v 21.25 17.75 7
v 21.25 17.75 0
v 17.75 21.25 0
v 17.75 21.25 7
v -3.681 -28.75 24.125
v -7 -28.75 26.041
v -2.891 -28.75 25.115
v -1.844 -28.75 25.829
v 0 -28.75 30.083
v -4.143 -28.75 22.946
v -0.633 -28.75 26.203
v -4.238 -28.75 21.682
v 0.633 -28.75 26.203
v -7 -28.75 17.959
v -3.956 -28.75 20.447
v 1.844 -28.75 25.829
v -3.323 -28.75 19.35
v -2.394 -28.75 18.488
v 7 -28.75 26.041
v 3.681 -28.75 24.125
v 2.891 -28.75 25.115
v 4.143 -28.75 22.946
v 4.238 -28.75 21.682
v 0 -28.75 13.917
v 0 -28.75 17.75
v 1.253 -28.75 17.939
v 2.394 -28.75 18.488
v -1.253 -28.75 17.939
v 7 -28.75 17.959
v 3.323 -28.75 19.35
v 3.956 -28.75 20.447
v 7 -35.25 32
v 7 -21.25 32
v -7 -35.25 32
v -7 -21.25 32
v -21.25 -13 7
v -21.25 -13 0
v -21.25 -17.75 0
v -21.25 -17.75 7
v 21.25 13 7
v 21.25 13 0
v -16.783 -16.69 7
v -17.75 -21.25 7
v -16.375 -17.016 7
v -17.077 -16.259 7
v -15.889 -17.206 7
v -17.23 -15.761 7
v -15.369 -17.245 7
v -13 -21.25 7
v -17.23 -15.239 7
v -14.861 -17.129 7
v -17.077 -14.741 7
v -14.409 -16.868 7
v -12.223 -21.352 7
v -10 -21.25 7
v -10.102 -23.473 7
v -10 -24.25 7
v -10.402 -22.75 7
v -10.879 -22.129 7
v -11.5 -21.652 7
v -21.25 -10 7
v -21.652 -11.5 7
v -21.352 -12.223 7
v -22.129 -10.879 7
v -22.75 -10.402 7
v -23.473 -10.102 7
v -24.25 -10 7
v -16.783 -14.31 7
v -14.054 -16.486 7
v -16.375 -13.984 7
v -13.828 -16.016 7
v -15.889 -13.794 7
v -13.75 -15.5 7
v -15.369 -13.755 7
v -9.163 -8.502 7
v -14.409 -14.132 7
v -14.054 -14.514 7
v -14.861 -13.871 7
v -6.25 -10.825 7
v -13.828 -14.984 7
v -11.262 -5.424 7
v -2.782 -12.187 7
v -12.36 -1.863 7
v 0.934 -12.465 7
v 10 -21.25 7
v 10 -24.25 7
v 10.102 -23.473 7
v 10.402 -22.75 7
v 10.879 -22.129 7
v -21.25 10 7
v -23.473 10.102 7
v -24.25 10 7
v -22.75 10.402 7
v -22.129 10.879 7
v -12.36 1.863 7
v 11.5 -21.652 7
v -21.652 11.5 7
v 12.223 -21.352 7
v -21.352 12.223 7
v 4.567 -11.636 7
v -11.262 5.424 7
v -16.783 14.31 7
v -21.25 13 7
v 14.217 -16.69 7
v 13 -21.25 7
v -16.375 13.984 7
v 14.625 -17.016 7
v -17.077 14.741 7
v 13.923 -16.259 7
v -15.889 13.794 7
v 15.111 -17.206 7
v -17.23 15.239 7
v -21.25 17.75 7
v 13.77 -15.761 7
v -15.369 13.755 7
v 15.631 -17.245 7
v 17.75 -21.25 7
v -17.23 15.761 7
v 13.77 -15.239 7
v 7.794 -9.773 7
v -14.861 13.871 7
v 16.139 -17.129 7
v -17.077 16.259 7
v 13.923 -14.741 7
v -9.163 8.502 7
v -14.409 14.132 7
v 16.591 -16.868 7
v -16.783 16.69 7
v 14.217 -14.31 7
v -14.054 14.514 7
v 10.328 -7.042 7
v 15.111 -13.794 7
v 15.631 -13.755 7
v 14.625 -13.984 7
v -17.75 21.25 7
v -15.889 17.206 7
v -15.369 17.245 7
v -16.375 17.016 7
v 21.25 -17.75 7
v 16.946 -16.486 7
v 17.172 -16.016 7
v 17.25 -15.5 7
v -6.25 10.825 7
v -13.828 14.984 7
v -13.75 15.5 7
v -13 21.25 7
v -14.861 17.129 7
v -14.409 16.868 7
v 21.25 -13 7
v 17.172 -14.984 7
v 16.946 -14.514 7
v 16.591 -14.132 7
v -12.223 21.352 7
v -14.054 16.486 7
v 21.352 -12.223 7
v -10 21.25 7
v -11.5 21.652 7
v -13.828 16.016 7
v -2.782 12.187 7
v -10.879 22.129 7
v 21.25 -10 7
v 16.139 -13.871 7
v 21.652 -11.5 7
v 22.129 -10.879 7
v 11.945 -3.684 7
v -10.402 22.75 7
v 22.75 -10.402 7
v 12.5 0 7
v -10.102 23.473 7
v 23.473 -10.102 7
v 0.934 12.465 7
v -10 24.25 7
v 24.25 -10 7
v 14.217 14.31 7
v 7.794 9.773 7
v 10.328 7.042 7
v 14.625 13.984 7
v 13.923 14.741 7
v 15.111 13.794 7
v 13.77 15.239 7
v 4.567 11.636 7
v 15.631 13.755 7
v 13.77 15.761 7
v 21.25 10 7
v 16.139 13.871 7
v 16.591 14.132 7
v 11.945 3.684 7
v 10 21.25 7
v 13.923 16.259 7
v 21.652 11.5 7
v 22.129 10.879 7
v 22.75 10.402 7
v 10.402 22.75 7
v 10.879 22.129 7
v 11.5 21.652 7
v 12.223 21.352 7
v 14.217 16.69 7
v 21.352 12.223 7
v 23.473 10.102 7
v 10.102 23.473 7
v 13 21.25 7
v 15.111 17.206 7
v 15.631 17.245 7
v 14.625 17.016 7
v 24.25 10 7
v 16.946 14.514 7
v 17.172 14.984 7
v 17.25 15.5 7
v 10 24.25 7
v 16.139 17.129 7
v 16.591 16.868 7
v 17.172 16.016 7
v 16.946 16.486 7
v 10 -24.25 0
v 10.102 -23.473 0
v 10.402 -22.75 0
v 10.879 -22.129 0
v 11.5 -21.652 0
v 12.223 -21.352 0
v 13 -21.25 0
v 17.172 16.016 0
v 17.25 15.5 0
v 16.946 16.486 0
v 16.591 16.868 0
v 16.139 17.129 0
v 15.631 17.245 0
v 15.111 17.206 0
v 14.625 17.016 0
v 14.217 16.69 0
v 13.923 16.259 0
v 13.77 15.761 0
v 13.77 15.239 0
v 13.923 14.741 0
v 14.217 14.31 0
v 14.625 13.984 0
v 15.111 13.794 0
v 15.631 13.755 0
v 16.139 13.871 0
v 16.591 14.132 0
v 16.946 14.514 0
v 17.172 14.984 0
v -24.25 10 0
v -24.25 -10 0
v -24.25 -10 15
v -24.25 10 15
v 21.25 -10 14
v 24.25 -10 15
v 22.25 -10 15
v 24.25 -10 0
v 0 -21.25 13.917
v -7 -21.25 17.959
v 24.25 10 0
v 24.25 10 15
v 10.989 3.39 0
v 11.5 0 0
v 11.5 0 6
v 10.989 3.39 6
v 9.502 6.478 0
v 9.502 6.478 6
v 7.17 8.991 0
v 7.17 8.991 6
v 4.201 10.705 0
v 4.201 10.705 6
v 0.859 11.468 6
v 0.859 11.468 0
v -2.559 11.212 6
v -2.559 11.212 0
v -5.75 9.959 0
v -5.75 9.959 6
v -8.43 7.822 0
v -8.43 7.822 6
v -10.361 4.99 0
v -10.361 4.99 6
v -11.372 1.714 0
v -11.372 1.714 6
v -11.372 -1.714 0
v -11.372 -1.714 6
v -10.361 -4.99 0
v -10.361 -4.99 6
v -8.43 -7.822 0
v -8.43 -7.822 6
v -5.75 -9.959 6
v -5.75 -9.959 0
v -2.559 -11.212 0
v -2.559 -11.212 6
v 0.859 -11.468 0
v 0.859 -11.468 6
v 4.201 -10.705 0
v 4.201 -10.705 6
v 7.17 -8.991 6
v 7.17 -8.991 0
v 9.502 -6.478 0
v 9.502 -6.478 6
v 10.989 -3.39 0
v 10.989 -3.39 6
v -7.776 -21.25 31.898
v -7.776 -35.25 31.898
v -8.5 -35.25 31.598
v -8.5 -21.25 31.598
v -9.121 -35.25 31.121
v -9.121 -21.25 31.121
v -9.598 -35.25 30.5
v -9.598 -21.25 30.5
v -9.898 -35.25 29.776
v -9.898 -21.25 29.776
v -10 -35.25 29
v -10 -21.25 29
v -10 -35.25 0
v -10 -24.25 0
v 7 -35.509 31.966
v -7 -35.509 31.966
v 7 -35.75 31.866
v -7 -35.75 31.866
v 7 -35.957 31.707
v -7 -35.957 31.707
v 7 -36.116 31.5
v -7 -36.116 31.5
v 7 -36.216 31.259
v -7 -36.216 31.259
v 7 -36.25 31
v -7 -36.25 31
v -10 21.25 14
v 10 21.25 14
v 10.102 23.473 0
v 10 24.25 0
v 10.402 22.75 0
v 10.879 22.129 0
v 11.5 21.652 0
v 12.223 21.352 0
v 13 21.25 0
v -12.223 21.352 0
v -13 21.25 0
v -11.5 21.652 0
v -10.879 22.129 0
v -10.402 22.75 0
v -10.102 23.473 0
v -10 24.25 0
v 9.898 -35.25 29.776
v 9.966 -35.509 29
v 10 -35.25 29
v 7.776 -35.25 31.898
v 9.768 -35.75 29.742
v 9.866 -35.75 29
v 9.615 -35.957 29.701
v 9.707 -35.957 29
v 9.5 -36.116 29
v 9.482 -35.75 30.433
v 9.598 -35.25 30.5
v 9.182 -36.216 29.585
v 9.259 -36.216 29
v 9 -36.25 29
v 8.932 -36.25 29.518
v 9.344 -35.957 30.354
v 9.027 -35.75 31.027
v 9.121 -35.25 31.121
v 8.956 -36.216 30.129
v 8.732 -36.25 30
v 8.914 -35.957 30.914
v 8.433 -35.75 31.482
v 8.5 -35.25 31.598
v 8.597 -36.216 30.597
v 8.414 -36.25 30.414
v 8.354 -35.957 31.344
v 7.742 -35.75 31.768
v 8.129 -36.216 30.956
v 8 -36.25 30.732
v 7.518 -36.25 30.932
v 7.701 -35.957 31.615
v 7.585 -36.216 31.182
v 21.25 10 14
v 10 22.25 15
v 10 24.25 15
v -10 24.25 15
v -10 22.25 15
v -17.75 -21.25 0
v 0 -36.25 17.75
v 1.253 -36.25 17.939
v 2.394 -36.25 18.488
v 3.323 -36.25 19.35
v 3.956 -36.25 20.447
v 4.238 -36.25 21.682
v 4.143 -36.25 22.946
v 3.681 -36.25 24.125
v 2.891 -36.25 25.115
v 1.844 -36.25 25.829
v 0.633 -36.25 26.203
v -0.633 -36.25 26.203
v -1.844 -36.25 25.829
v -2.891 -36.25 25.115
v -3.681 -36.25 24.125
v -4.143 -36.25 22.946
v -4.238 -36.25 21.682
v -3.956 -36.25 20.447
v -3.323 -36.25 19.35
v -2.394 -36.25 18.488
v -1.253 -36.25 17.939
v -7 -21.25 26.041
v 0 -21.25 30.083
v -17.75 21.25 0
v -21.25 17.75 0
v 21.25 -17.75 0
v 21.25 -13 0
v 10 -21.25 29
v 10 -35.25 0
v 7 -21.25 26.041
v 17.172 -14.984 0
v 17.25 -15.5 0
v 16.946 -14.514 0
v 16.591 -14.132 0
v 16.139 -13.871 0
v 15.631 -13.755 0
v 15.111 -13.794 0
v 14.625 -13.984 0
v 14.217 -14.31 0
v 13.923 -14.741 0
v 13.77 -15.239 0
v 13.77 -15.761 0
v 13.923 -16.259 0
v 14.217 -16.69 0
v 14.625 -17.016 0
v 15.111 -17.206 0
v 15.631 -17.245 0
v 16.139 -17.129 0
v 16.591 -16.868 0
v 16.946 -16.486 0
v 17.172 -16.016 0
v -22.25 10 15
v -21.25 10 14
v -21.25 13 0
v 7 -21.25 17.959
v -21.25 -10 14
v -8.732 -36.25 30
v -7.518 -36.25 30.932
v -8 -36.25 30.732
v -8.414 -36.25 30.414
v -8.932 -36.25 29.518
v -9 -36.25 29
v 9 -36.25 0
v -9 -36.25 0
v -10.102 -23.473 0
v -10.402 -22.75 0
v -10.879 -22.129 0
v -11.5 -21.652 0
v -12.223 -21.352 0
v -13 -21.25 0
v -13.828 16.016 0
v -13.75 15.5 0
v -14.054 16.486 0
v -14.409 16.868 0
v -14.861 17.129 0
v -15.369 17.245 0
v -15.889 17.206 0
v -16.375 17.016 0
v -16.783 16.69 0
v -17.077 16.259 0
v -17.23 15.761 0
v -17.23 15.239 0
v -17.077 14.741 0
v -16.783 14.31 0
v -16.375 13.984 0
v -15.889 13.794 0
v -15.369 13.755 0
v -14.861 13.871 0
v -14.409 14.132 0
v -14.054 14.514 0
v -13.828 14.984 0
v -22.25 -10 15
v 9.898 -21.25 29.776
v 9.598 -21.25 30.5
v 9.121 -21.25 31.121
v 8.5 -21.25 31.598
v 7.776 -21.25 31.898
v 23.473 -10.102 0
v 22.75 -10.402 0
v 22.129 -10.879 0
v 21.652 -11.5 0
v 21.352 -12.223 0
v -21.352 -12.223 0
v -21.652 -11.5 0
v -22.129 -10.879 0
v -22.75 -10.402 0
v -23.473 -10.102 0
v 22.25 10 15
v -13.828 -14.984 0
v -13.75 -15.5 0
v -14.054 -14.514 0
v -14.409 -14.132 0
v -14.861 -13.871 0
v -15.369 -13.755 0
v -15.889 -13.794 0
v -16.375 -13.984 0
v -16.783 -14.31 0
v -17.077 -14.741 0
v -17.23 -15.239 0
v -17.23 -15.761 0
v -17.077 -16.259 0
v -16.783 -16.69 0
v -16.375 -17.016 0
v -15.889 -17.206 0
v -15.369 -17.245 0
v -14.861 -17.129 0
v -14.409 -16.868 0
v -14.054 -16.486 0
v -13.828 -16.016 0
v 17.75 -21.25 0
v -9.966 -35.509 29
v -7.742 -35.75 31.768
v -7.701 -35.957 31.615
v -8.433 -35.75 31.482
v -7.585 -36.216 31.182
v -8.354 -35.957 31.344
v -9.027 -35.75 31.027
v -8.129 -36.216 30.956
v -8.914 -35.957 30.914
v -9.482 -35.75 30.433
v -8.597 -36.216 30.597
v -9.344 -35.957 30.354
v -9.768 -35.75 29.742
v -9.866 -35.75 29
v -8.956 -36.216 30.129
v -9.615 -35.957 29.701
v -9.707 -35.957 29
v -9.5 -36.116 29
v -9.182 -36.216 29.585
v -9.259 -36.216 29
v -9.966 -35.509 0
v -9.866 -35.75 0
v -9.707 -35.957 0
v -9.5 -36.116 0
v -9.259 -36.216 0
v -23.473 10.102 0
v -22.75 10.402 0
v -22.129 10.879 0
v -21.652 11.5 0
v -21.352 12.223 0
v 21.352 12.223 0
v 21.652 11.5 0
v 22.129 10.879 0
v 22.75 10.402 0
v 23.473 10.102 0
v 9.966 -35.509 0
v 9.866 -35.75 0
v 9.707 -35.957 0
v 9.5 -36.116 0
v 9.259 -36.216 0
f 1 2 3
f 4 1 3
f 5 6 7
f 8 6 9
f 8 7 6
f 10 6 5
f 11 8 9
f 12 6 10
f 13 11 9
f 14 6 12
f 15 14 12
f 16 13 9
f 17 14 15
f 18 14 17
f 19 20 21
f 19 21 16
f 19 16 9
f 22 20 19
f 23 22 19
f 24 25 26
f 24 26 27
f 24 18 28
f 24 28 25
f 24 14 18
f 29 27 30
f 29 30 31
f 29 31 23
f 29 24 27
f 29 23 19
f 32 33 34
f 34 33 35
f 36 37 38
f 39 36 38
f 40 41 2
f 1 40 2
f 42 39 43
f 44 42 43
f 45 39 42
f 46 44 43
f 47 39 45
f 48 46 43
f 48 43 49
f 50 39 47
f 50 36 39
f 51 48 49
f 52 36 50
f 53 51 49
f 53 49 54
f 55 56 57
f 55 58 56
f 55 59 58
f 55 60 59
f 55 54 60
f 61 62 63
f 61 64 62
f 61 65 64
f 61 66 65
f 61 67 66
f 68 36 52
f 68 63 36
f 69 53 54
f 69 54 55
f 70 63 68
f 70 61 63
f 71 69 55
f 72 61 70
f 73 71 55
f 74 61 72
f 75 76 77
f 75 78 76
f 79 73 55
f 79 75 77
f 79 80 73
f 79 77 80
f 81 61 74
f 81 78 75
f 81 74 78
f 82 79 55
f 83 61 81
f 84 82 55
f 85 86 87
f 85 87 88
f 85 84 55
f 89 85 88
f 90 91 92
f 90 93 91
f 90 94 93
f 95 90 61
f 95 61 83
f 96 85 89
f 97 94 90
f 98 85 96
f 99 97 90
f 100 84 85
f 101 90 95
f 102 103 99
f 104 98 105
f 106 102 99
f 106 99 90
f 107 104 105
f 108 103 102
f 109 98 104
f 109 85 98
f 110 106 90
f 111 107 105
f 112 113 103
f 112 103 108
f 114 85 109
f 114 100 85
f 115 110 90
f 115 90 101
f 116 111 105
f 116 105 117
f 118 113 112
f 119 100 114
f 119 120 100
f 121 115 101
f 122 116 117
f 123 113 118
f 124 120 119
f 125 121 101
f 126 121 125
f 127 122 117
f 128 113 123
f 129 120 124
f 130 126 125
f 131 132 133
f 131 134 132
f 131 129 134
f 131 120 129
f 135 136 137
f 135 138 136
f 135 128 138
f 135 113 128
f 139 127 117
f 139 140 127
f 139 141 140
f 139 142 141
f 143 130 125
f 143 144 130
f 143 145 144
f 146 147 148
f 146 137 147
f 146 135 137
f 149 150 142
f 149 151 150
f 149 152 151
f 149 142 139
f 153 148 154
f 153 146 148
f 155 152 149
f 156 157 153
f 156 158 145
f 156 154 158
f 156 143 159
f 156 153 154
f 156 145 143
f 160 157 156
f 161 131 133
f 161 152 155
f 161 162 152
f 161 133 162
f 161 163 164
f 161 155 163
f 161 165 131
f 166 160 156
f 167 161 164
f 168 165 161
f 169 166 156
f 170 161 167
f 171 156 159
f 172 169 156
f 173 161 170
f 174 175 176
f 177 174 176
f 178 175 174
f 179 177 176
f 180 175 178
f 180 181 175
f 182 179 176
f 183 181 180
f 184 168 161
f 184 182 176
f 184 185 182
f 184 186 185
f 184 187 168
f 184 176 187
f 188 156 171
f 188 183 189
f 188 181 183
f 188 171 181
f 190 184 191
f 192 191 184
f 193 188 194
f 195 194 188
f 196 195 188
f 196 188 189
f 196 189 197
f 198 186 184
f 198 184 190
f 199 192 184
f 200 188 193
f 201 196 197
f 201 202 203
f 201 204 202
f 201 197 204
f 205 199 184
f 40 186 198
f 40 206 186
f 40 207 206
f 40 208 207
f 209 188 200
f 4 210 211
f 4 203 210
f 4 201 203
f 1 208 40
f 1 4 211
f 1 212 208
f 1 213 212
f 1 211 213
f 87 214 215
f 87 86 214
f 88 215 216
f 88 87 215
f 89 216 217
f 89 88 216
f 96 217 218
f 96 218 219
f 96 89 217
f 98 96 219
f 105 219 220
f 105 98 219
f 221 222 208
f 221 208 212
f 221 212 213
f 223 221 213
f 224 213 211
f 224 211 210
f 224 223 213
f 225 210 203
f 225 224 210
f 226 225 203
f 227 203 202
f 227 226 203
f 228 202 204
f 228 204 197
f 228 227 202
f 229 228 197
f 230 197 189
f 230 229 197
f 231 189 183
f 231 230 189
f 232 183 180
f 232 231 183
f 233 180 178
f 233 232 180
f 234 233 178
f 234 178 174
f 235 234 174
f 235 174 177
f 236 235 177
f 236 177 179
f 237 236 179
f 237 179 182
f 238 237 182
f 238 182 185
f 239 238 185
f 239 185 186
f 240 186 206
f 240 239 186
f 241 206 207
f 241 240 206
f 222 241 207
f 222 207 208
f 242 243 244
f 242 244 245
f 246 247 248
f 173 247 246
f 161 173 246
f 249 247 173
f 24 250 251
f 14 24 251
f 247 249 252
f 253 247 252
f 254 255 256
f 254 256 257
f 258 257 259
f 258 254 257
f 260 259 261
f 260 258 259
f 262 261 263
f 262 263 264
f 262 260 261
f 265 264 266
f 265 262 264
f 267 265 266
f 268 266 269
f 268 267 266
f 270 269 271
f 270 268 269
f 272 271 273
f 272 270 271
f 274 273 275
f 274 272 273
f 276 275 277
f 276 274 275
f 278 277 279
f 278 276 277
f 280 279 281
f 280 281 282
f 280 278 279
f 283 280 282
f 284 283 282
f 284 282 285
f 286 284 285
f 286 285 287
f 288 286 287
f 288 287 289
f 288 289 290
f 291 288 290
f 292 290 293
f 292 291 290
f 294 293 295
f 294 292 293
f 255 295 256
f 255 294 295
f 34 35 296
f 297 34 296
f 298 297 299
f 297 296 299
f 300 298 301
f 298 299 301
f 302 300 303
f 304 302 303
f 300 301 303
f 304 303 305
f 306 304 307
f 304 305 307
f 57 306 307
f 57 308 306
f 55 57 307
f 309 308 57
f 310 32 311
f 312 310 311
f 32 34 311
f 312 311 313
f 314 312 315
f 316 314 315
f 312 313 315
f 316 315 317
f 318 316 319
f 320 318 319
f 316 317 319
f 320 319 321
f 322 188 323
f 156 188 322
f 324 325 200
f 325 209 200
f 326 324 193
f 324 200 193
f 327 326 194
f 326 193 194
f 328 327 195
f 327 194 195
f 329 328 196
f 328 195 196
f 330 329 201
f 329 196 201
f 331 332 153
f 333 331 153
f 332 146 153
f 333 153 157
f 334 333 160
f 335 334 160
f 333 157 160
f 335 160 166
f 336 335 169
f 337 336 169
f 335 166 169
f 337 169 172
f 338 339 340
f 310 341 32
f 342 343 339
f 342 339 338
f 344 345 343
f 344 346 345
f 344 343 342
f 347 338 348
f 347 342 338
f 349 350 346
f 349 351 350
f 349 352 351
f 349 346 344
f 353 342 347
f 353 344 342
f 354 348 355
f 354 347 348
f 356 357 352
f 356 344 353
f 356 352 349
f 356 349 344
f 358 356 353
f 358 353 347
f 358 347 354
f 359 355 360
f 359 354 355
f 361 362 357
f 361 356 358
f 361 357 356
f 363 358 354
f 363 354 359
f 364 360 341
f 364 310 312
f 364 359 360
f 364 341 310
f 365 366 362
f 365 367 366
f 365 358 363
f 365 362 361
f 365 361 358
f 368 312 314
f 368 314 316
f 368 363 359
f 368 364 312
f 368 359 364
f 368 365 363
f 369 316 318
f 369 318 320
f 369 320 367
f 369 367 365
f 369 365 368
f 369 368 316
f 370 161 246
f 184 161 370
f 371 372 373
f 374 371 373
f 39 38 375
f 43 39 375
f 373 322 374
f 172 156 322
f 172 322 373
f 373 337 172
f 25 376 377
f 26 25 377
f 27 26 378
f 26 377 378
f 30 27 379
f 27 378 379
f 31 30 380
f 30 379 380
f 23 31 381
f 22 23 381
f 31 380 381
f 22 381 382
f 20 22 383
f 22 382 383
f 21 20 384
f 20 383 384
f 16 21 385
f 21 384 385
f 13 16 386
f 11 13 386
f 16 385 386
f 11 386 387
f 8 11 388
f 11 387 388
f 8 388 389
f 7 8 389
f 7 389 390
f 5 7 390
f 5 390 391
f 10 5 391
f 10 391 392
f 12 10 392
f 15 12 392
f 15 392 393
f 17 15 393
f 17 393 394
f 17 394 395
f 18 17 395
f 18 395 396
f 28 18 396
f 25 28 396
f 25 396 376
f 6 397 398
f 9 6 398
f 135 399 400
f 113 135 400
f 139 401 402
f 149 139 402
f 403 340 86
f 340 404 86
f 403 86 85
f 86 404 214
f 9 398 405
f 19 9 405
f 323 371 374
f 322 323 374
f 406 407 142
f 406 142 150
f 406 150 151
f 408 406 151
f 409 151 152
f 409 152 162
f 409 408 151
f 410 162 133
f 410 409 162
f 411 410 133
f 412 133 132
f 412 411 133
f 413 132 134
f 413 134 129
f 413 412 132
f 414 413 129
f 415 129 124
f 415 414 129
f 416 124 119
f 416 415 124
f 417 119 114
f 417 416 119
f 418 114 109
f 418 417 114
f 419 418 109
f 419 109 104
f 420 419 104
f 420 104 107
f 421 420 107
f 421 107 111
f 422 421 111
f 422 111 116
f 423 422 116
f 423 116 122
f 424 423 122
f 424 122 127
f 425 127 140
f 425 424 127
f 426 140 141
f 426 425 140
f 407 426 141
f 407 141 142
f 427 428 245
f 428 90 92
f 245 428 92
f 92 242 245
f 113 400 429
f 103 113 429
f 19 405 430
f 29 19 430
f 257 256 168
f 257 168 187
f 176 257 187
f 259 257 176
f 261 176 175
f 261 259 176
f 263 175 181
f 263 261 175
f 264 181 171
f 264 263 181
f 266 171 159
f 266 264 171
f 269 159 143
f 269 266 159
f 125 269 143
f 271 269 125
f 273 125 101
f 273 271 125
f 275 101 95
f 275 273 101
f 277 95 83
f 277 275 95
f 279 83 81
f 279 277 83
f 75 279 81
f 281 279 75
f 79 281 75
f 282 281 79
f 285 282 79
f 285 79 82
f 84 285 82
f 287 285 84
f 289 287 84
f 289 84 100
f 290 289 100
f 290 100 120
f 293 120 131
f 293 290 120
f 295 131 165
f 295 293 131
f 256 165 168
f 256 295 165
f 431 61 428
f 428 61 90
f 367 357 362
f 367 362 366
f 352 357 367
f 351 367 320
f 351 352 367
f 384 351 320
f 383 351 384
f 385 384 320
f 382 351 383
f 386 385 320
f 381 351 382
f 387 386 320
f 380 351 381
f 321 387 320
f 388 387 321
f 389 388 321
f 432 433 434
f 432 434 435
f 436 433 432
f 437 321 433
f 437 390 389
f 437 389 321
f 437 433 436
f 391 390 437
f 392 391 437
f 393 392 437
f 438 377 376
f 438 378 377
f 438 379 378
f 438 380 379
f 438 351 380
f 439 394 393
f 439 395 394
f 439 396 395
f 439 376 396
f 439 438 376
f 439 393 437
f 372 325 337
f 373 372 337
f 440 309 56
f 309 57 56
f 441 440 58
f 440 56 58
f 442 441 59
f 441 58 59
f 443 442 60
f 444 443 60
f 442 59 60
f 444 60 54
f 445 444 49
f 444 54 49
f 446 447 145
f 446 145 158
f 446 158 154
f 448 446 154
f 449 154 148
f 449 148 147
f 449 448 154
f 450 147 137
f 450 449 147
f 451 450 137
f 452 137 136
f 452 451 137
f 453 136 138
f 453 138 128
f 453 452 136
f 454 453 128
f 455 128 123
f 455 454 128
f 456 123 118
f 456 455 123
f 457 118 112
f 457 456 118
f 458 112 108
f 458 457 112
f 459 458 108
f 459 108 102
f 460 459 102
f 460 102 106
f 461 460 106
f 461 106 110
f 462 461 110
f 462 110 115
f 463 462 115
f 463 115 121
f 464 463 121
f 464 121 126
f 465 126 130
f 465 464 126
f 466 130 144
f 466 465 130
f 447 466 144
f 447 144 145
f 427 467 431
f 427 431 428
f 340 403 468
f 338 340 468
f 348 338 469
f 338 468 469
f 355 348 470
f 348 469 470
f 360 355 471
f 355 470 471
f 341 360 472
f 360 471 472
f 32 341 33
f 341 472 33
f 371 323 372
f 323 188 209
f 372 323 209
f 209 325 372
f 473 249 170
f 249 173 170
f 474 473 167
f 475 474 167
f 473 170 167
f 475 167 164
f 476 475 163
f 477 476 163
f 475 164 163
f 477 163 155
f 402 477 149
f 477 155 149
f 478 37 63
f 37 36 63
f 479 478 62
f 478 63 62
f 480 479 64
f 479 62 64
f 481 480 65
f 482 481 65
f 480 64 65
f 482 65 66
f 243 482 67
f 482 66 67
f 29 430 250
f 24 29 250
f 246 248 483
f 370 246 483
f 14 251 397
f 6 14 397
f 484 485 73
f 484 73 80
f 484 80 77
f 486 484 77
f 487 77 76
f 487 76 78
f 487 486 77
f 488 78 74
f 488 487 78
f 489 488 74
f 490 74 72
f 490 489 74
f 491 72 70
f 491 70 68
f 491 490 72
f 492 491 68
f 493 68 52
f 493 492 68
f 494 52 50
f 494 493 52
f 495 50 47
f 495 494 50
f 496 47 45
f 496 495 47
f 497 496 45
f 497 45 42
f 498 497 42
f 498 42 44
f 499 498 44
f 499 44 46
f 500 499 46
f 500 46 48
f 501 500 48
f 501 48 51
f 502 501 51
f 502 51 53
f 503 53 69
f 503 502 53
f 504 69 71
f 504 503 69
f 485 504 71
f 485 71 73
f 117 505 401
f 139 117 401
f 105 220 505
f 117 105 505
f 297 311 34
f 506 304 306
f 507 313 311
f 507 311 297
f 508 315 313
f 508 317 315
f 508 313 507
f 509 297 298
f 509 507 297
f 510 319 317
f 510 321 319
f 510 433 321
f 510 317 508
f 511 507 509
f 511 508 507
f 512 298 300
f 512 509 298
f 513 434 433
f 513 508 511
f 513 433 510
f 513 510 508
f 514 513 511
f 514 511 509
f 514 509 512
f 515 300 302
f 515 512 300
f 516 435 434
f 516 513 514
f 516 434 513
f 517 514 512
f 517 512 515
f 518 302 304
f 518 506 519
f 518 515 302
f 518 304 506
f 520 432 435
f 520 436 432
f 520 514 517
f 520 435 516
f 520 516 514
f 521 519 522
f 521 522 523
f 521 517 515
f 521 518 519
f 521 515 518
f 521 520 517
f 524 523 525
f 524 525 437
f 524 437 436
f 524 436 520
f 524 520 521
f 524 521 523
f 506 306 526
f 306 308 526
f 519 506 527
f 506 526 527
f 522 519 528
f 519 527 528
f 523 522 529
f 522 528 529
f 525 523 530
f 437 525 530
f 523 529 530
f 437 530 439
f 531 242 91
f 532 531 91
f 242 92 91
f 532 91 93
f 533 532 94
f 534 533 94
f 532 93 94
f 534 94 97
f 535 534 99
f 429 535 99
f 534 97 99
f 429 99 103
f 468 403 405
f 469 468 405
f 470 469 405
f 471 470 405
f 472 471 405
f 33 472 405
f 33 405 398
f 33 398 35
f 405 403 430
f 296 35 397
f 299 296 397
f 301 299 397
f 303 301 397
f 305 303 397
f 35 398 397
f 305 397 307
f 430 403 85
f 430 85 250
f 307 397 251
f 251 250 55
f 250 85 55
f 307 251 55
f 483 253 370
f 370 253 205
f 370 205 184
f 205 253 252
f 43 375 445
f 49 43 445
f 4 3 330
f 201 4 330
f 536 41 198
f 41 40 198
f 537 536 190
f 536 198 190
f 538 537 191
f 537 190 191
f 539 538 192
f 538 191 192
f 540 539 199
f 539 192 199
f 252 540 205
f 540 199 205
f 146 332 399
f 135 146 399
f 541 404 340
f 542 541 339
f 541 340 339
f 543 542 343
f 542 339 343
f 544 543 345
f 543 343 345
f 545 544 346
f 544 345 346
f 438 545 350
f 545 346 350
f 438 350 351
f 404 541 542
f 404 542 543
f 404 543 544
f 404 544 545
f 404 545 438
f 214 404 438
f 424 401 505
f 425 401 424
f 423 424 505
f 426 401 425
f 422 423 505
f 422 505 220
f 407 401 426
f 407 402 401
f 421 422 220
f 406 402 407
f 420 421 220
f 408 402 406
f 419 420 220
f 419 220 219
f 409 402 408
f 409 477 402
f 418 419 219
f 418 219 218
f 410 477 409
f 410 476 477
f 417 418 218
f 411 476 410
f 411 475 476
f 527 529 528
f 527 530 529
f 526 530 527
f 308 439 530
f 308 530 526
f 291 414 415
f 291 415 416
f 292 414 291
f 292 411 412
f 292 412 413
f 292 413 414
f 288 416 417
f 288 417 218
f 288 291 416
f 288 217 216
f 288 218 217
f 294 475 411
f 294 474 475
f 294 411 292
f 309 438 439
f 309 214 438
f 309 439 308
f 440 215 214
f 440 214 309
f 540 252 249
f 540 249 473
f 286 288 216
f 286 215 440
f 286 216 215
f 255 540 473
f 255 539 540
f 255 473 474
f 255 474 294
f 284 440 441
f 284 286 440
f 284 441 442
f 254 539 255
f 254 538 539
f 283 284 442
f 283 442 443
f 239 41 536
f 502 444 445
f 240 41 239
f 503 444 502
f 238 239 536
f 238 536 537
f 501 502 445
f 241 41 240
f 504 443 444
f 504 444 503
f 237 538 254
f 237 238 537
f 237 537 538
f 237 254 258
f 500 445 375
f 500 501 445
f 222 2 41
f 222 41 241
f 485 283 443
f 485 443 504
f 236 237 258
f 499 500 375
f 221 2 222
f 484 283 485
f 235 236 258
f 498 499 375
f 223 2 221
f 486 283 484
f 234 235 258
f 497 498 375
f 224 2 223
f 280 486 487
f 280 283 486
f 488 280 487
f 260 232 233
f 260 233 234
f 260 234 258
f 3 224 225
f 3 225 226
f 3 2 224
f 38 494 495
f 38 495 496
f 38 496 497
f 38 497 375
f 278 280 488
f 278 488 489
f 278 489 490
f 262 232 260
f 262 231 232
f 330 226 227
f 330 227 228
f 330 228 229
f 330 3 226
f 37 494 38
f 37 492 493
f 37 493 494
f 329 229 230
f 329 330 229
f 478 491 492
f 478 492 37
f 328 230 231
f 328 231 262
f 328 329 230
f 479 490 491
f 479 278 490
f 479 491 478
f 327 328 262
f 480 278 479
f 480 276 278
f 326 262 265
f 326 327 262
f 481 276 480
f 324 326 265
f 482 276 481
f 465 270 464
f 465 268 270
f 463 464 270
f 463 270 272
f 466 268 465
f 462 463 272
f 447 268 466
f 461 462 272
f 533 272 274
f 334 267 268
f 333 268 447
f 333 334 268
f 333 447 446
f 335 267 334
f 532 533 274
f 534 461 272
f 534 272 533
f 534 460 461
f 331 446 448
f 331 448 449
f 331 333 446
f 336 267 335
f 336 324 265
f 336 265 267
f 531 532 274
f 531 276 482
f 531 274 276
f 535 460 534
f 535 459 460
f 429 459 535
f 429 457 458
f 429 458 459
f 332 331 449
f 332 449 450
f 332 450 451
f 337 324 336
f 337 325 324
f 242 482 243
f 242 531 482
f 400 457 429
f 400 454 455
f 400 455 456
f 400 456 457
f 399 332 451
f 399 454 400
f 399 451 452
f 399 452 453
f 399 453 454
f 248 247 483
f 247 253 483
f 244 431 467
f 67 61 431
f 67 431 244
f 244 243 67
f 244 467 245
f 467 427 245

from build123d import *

# Parameters (mm, degrees)
ESQUISSE1_R             = 11.5
ESQUISSE1_R_2           = 1.75
BOSS_EXTRU_1_DEPTH      = 7
ESQUISSE2_W             = 20
ESQUISSE2_H             = 3
ESQUISSE2_W_2           = 3
ESQUISSE2_H_2           = 20
BOSS_EXTRU_2_DEPTH      = 15
ESQUISSE3_W             = 20
ESQUISSE3_H             = 15
BOSS_EXTRU_3_DEPTH      = 32
CONG_1_R                = 3
CONG_2_R                = 3
CHANFREIN1_SIZE         = 1
ESQUISSE4_R             = 4.25
ENL_V_MAT_EXTRU_1_DEPTH = 15
CONG_3_R                = 1
ENL_V_MAT_EXTRU_2_DEPTH = 7.5


with BuildPart() as part:
    # Esquisse1 → Boss.-Extru.1 (new body)
    with BuildSketch(Plane.XY):
        Polygon((-17.749999999, 21.249999999), (-21.249999999, 17.749999999), (-21.249999999, -17.749999999), (-17.749999999, -21.250000001), (17.749999999, -21.250000001), (21.249999999, -17.749999999), (21.249999999, 17.749999999), (17.749999999, 21.249999999), align=None)
        Circle(ESQUISSE1_R, mode=Mode.SUBTRACT)
        with Locations((-15.5, 15.5)):
            Circle(ESQUISSE1_R_2, mode=Mode.SUBTRACT)
        with Locations((15.5, 15.5)):
            Circle(ESQUISSE1_R_2, mode=Mode.SUBTRACT)
        with Locations((15.5, -15.5)):
            Circle(ESQUISSE1_R_2, mode=Mode.SUBTRACT)
        with Locations((-15.5, -15.5)):
            Circle(ESQUISSE1_R_2, mode=Mode.SUBTRACT)
    extrude(amount=BOSS_EXTRU_1_DEPTH)

    # Esquisse2 → Boss.-Extru.2 (add)
    with BuildSketch(Plane(origin=(0, 0, 0), x_dir=(-1, 0, 0), z_dir=(0, 0, -1))):
        with Locations((0, 22.749999999)):
            Rectangle(ESQUISSE2_W, ESQUISSE2_H)
        with Locations((22.749999999, 0)):
            Rectangle(ESQUISSE2_W_2, ESQUISSE2_H_2)
        with Locations((-22.749999999, 0)):
            Rectangle(ESQUISSE2_W_2, ESQUISSE2_H_2)
    extrude(amount=-BOSS_EXTRU_2_DEPTH)

    # Esquisse3 → Boss.-Extru.3 (add)
    with BuildSketch(Plane(origin=(0, 0, 0), x_dir=(-1, 0, 0), z_dir=(0, 0, -1))):
        with Locations((0, -28.750000001)):
            Rectangle(ESQUISSE3_W, ESQUISSE3_H)
    extrude(amount=-BOSS_EXTRU_3_DEPTH)

    # Congé1
    cong_1_edges = [part.edges().sort_by_distance(p)[0] for p in [
        (-21.249999999, -10, 3.5),
        (-21.249999999, 10, 3.5),
        (-10, 21.249999999, 3.5),
        (10, 21.249999999, 3.5),
        (21.249999999, 10, 3.5),
        (21.249999999, -10, 3.5),
        (10, -21.250000001, 3.5),
        (-10, -21.250000001, 3.5),
    ]]
    fillet(cong_1_edges, radius=CONG_1_R - 0.0001)  # a hair under: the kernel refuses the full size

    # Congé2
    cong_2_edges = [part.edges().sort_by_distance(p)[0] for p in [
        (10, -28.750000001, 32),
        (-10, -28.750000001, 32),
    ]]
    fillet(cong_2_edges, radius=CONG_2_R)

    # Chanfrein1
    chanfrein1_edges = [part.edges().sort_by_distance(p)[0] for p in [
        (-11.5, 0, 7),
        (0, 21.249999999, 15),
        (-21.249999999, 0, 15),
        (21.249999999, 0, 15),
    ]]
    chamfer(chanfrein1_edges, length=CHANFREIN1_SIZE)

    # Esquisse4 → Enlèv. mat.-Extru.1 (cut)
    with BuildSketch(Plane(origin=(0, -36.250000001, 0), x_dir=(-1, 0, 0), z_dir=(0, -1, 0))):
        with Locations(Location((0, -22, 0), (0, 0, 90))):
            Circle(ESQUISSE4_R)
    extrude(amount=-ENL_V_MAT_EXTRU_1_DEPTH, mode=Mode.SUBTRACT)

    # Congé3
    cong_3_edges = [part.edges().sort_by_distance(p)[0] for p in [
        (10, -36.250000001, 14.5),
        (0, -36.250000001, 32),
        (-10, -36.250000001, 14.5),
        (-9.121320344, -36.250000001, 31.121320344),
        (9.121320344, -36.250000001, 31.121320344),
    ]]
    fillet(cong_3_edges, radius=CONG_3_R)

    # Esquisse5 → Enlèv. mat.-Extru.2 (cut)
    with BuildSketch(Plane(origin=(0, -21.250000001, 0), x_dir=(1, 0, 0), z_dir=(0, 1, 0))):
        Polygon((0, -30.082903769), (7, -26.041451884), (7, -17.958548116), (0, -13.917096231), (-7, -17.958548116), (-7, -26.041451884), align=None)
    extrude(amount=-ENL_V_MAT_EXTRU_2_DEPTH, mode=Mode.SUBTRACT)


solid = part.part
